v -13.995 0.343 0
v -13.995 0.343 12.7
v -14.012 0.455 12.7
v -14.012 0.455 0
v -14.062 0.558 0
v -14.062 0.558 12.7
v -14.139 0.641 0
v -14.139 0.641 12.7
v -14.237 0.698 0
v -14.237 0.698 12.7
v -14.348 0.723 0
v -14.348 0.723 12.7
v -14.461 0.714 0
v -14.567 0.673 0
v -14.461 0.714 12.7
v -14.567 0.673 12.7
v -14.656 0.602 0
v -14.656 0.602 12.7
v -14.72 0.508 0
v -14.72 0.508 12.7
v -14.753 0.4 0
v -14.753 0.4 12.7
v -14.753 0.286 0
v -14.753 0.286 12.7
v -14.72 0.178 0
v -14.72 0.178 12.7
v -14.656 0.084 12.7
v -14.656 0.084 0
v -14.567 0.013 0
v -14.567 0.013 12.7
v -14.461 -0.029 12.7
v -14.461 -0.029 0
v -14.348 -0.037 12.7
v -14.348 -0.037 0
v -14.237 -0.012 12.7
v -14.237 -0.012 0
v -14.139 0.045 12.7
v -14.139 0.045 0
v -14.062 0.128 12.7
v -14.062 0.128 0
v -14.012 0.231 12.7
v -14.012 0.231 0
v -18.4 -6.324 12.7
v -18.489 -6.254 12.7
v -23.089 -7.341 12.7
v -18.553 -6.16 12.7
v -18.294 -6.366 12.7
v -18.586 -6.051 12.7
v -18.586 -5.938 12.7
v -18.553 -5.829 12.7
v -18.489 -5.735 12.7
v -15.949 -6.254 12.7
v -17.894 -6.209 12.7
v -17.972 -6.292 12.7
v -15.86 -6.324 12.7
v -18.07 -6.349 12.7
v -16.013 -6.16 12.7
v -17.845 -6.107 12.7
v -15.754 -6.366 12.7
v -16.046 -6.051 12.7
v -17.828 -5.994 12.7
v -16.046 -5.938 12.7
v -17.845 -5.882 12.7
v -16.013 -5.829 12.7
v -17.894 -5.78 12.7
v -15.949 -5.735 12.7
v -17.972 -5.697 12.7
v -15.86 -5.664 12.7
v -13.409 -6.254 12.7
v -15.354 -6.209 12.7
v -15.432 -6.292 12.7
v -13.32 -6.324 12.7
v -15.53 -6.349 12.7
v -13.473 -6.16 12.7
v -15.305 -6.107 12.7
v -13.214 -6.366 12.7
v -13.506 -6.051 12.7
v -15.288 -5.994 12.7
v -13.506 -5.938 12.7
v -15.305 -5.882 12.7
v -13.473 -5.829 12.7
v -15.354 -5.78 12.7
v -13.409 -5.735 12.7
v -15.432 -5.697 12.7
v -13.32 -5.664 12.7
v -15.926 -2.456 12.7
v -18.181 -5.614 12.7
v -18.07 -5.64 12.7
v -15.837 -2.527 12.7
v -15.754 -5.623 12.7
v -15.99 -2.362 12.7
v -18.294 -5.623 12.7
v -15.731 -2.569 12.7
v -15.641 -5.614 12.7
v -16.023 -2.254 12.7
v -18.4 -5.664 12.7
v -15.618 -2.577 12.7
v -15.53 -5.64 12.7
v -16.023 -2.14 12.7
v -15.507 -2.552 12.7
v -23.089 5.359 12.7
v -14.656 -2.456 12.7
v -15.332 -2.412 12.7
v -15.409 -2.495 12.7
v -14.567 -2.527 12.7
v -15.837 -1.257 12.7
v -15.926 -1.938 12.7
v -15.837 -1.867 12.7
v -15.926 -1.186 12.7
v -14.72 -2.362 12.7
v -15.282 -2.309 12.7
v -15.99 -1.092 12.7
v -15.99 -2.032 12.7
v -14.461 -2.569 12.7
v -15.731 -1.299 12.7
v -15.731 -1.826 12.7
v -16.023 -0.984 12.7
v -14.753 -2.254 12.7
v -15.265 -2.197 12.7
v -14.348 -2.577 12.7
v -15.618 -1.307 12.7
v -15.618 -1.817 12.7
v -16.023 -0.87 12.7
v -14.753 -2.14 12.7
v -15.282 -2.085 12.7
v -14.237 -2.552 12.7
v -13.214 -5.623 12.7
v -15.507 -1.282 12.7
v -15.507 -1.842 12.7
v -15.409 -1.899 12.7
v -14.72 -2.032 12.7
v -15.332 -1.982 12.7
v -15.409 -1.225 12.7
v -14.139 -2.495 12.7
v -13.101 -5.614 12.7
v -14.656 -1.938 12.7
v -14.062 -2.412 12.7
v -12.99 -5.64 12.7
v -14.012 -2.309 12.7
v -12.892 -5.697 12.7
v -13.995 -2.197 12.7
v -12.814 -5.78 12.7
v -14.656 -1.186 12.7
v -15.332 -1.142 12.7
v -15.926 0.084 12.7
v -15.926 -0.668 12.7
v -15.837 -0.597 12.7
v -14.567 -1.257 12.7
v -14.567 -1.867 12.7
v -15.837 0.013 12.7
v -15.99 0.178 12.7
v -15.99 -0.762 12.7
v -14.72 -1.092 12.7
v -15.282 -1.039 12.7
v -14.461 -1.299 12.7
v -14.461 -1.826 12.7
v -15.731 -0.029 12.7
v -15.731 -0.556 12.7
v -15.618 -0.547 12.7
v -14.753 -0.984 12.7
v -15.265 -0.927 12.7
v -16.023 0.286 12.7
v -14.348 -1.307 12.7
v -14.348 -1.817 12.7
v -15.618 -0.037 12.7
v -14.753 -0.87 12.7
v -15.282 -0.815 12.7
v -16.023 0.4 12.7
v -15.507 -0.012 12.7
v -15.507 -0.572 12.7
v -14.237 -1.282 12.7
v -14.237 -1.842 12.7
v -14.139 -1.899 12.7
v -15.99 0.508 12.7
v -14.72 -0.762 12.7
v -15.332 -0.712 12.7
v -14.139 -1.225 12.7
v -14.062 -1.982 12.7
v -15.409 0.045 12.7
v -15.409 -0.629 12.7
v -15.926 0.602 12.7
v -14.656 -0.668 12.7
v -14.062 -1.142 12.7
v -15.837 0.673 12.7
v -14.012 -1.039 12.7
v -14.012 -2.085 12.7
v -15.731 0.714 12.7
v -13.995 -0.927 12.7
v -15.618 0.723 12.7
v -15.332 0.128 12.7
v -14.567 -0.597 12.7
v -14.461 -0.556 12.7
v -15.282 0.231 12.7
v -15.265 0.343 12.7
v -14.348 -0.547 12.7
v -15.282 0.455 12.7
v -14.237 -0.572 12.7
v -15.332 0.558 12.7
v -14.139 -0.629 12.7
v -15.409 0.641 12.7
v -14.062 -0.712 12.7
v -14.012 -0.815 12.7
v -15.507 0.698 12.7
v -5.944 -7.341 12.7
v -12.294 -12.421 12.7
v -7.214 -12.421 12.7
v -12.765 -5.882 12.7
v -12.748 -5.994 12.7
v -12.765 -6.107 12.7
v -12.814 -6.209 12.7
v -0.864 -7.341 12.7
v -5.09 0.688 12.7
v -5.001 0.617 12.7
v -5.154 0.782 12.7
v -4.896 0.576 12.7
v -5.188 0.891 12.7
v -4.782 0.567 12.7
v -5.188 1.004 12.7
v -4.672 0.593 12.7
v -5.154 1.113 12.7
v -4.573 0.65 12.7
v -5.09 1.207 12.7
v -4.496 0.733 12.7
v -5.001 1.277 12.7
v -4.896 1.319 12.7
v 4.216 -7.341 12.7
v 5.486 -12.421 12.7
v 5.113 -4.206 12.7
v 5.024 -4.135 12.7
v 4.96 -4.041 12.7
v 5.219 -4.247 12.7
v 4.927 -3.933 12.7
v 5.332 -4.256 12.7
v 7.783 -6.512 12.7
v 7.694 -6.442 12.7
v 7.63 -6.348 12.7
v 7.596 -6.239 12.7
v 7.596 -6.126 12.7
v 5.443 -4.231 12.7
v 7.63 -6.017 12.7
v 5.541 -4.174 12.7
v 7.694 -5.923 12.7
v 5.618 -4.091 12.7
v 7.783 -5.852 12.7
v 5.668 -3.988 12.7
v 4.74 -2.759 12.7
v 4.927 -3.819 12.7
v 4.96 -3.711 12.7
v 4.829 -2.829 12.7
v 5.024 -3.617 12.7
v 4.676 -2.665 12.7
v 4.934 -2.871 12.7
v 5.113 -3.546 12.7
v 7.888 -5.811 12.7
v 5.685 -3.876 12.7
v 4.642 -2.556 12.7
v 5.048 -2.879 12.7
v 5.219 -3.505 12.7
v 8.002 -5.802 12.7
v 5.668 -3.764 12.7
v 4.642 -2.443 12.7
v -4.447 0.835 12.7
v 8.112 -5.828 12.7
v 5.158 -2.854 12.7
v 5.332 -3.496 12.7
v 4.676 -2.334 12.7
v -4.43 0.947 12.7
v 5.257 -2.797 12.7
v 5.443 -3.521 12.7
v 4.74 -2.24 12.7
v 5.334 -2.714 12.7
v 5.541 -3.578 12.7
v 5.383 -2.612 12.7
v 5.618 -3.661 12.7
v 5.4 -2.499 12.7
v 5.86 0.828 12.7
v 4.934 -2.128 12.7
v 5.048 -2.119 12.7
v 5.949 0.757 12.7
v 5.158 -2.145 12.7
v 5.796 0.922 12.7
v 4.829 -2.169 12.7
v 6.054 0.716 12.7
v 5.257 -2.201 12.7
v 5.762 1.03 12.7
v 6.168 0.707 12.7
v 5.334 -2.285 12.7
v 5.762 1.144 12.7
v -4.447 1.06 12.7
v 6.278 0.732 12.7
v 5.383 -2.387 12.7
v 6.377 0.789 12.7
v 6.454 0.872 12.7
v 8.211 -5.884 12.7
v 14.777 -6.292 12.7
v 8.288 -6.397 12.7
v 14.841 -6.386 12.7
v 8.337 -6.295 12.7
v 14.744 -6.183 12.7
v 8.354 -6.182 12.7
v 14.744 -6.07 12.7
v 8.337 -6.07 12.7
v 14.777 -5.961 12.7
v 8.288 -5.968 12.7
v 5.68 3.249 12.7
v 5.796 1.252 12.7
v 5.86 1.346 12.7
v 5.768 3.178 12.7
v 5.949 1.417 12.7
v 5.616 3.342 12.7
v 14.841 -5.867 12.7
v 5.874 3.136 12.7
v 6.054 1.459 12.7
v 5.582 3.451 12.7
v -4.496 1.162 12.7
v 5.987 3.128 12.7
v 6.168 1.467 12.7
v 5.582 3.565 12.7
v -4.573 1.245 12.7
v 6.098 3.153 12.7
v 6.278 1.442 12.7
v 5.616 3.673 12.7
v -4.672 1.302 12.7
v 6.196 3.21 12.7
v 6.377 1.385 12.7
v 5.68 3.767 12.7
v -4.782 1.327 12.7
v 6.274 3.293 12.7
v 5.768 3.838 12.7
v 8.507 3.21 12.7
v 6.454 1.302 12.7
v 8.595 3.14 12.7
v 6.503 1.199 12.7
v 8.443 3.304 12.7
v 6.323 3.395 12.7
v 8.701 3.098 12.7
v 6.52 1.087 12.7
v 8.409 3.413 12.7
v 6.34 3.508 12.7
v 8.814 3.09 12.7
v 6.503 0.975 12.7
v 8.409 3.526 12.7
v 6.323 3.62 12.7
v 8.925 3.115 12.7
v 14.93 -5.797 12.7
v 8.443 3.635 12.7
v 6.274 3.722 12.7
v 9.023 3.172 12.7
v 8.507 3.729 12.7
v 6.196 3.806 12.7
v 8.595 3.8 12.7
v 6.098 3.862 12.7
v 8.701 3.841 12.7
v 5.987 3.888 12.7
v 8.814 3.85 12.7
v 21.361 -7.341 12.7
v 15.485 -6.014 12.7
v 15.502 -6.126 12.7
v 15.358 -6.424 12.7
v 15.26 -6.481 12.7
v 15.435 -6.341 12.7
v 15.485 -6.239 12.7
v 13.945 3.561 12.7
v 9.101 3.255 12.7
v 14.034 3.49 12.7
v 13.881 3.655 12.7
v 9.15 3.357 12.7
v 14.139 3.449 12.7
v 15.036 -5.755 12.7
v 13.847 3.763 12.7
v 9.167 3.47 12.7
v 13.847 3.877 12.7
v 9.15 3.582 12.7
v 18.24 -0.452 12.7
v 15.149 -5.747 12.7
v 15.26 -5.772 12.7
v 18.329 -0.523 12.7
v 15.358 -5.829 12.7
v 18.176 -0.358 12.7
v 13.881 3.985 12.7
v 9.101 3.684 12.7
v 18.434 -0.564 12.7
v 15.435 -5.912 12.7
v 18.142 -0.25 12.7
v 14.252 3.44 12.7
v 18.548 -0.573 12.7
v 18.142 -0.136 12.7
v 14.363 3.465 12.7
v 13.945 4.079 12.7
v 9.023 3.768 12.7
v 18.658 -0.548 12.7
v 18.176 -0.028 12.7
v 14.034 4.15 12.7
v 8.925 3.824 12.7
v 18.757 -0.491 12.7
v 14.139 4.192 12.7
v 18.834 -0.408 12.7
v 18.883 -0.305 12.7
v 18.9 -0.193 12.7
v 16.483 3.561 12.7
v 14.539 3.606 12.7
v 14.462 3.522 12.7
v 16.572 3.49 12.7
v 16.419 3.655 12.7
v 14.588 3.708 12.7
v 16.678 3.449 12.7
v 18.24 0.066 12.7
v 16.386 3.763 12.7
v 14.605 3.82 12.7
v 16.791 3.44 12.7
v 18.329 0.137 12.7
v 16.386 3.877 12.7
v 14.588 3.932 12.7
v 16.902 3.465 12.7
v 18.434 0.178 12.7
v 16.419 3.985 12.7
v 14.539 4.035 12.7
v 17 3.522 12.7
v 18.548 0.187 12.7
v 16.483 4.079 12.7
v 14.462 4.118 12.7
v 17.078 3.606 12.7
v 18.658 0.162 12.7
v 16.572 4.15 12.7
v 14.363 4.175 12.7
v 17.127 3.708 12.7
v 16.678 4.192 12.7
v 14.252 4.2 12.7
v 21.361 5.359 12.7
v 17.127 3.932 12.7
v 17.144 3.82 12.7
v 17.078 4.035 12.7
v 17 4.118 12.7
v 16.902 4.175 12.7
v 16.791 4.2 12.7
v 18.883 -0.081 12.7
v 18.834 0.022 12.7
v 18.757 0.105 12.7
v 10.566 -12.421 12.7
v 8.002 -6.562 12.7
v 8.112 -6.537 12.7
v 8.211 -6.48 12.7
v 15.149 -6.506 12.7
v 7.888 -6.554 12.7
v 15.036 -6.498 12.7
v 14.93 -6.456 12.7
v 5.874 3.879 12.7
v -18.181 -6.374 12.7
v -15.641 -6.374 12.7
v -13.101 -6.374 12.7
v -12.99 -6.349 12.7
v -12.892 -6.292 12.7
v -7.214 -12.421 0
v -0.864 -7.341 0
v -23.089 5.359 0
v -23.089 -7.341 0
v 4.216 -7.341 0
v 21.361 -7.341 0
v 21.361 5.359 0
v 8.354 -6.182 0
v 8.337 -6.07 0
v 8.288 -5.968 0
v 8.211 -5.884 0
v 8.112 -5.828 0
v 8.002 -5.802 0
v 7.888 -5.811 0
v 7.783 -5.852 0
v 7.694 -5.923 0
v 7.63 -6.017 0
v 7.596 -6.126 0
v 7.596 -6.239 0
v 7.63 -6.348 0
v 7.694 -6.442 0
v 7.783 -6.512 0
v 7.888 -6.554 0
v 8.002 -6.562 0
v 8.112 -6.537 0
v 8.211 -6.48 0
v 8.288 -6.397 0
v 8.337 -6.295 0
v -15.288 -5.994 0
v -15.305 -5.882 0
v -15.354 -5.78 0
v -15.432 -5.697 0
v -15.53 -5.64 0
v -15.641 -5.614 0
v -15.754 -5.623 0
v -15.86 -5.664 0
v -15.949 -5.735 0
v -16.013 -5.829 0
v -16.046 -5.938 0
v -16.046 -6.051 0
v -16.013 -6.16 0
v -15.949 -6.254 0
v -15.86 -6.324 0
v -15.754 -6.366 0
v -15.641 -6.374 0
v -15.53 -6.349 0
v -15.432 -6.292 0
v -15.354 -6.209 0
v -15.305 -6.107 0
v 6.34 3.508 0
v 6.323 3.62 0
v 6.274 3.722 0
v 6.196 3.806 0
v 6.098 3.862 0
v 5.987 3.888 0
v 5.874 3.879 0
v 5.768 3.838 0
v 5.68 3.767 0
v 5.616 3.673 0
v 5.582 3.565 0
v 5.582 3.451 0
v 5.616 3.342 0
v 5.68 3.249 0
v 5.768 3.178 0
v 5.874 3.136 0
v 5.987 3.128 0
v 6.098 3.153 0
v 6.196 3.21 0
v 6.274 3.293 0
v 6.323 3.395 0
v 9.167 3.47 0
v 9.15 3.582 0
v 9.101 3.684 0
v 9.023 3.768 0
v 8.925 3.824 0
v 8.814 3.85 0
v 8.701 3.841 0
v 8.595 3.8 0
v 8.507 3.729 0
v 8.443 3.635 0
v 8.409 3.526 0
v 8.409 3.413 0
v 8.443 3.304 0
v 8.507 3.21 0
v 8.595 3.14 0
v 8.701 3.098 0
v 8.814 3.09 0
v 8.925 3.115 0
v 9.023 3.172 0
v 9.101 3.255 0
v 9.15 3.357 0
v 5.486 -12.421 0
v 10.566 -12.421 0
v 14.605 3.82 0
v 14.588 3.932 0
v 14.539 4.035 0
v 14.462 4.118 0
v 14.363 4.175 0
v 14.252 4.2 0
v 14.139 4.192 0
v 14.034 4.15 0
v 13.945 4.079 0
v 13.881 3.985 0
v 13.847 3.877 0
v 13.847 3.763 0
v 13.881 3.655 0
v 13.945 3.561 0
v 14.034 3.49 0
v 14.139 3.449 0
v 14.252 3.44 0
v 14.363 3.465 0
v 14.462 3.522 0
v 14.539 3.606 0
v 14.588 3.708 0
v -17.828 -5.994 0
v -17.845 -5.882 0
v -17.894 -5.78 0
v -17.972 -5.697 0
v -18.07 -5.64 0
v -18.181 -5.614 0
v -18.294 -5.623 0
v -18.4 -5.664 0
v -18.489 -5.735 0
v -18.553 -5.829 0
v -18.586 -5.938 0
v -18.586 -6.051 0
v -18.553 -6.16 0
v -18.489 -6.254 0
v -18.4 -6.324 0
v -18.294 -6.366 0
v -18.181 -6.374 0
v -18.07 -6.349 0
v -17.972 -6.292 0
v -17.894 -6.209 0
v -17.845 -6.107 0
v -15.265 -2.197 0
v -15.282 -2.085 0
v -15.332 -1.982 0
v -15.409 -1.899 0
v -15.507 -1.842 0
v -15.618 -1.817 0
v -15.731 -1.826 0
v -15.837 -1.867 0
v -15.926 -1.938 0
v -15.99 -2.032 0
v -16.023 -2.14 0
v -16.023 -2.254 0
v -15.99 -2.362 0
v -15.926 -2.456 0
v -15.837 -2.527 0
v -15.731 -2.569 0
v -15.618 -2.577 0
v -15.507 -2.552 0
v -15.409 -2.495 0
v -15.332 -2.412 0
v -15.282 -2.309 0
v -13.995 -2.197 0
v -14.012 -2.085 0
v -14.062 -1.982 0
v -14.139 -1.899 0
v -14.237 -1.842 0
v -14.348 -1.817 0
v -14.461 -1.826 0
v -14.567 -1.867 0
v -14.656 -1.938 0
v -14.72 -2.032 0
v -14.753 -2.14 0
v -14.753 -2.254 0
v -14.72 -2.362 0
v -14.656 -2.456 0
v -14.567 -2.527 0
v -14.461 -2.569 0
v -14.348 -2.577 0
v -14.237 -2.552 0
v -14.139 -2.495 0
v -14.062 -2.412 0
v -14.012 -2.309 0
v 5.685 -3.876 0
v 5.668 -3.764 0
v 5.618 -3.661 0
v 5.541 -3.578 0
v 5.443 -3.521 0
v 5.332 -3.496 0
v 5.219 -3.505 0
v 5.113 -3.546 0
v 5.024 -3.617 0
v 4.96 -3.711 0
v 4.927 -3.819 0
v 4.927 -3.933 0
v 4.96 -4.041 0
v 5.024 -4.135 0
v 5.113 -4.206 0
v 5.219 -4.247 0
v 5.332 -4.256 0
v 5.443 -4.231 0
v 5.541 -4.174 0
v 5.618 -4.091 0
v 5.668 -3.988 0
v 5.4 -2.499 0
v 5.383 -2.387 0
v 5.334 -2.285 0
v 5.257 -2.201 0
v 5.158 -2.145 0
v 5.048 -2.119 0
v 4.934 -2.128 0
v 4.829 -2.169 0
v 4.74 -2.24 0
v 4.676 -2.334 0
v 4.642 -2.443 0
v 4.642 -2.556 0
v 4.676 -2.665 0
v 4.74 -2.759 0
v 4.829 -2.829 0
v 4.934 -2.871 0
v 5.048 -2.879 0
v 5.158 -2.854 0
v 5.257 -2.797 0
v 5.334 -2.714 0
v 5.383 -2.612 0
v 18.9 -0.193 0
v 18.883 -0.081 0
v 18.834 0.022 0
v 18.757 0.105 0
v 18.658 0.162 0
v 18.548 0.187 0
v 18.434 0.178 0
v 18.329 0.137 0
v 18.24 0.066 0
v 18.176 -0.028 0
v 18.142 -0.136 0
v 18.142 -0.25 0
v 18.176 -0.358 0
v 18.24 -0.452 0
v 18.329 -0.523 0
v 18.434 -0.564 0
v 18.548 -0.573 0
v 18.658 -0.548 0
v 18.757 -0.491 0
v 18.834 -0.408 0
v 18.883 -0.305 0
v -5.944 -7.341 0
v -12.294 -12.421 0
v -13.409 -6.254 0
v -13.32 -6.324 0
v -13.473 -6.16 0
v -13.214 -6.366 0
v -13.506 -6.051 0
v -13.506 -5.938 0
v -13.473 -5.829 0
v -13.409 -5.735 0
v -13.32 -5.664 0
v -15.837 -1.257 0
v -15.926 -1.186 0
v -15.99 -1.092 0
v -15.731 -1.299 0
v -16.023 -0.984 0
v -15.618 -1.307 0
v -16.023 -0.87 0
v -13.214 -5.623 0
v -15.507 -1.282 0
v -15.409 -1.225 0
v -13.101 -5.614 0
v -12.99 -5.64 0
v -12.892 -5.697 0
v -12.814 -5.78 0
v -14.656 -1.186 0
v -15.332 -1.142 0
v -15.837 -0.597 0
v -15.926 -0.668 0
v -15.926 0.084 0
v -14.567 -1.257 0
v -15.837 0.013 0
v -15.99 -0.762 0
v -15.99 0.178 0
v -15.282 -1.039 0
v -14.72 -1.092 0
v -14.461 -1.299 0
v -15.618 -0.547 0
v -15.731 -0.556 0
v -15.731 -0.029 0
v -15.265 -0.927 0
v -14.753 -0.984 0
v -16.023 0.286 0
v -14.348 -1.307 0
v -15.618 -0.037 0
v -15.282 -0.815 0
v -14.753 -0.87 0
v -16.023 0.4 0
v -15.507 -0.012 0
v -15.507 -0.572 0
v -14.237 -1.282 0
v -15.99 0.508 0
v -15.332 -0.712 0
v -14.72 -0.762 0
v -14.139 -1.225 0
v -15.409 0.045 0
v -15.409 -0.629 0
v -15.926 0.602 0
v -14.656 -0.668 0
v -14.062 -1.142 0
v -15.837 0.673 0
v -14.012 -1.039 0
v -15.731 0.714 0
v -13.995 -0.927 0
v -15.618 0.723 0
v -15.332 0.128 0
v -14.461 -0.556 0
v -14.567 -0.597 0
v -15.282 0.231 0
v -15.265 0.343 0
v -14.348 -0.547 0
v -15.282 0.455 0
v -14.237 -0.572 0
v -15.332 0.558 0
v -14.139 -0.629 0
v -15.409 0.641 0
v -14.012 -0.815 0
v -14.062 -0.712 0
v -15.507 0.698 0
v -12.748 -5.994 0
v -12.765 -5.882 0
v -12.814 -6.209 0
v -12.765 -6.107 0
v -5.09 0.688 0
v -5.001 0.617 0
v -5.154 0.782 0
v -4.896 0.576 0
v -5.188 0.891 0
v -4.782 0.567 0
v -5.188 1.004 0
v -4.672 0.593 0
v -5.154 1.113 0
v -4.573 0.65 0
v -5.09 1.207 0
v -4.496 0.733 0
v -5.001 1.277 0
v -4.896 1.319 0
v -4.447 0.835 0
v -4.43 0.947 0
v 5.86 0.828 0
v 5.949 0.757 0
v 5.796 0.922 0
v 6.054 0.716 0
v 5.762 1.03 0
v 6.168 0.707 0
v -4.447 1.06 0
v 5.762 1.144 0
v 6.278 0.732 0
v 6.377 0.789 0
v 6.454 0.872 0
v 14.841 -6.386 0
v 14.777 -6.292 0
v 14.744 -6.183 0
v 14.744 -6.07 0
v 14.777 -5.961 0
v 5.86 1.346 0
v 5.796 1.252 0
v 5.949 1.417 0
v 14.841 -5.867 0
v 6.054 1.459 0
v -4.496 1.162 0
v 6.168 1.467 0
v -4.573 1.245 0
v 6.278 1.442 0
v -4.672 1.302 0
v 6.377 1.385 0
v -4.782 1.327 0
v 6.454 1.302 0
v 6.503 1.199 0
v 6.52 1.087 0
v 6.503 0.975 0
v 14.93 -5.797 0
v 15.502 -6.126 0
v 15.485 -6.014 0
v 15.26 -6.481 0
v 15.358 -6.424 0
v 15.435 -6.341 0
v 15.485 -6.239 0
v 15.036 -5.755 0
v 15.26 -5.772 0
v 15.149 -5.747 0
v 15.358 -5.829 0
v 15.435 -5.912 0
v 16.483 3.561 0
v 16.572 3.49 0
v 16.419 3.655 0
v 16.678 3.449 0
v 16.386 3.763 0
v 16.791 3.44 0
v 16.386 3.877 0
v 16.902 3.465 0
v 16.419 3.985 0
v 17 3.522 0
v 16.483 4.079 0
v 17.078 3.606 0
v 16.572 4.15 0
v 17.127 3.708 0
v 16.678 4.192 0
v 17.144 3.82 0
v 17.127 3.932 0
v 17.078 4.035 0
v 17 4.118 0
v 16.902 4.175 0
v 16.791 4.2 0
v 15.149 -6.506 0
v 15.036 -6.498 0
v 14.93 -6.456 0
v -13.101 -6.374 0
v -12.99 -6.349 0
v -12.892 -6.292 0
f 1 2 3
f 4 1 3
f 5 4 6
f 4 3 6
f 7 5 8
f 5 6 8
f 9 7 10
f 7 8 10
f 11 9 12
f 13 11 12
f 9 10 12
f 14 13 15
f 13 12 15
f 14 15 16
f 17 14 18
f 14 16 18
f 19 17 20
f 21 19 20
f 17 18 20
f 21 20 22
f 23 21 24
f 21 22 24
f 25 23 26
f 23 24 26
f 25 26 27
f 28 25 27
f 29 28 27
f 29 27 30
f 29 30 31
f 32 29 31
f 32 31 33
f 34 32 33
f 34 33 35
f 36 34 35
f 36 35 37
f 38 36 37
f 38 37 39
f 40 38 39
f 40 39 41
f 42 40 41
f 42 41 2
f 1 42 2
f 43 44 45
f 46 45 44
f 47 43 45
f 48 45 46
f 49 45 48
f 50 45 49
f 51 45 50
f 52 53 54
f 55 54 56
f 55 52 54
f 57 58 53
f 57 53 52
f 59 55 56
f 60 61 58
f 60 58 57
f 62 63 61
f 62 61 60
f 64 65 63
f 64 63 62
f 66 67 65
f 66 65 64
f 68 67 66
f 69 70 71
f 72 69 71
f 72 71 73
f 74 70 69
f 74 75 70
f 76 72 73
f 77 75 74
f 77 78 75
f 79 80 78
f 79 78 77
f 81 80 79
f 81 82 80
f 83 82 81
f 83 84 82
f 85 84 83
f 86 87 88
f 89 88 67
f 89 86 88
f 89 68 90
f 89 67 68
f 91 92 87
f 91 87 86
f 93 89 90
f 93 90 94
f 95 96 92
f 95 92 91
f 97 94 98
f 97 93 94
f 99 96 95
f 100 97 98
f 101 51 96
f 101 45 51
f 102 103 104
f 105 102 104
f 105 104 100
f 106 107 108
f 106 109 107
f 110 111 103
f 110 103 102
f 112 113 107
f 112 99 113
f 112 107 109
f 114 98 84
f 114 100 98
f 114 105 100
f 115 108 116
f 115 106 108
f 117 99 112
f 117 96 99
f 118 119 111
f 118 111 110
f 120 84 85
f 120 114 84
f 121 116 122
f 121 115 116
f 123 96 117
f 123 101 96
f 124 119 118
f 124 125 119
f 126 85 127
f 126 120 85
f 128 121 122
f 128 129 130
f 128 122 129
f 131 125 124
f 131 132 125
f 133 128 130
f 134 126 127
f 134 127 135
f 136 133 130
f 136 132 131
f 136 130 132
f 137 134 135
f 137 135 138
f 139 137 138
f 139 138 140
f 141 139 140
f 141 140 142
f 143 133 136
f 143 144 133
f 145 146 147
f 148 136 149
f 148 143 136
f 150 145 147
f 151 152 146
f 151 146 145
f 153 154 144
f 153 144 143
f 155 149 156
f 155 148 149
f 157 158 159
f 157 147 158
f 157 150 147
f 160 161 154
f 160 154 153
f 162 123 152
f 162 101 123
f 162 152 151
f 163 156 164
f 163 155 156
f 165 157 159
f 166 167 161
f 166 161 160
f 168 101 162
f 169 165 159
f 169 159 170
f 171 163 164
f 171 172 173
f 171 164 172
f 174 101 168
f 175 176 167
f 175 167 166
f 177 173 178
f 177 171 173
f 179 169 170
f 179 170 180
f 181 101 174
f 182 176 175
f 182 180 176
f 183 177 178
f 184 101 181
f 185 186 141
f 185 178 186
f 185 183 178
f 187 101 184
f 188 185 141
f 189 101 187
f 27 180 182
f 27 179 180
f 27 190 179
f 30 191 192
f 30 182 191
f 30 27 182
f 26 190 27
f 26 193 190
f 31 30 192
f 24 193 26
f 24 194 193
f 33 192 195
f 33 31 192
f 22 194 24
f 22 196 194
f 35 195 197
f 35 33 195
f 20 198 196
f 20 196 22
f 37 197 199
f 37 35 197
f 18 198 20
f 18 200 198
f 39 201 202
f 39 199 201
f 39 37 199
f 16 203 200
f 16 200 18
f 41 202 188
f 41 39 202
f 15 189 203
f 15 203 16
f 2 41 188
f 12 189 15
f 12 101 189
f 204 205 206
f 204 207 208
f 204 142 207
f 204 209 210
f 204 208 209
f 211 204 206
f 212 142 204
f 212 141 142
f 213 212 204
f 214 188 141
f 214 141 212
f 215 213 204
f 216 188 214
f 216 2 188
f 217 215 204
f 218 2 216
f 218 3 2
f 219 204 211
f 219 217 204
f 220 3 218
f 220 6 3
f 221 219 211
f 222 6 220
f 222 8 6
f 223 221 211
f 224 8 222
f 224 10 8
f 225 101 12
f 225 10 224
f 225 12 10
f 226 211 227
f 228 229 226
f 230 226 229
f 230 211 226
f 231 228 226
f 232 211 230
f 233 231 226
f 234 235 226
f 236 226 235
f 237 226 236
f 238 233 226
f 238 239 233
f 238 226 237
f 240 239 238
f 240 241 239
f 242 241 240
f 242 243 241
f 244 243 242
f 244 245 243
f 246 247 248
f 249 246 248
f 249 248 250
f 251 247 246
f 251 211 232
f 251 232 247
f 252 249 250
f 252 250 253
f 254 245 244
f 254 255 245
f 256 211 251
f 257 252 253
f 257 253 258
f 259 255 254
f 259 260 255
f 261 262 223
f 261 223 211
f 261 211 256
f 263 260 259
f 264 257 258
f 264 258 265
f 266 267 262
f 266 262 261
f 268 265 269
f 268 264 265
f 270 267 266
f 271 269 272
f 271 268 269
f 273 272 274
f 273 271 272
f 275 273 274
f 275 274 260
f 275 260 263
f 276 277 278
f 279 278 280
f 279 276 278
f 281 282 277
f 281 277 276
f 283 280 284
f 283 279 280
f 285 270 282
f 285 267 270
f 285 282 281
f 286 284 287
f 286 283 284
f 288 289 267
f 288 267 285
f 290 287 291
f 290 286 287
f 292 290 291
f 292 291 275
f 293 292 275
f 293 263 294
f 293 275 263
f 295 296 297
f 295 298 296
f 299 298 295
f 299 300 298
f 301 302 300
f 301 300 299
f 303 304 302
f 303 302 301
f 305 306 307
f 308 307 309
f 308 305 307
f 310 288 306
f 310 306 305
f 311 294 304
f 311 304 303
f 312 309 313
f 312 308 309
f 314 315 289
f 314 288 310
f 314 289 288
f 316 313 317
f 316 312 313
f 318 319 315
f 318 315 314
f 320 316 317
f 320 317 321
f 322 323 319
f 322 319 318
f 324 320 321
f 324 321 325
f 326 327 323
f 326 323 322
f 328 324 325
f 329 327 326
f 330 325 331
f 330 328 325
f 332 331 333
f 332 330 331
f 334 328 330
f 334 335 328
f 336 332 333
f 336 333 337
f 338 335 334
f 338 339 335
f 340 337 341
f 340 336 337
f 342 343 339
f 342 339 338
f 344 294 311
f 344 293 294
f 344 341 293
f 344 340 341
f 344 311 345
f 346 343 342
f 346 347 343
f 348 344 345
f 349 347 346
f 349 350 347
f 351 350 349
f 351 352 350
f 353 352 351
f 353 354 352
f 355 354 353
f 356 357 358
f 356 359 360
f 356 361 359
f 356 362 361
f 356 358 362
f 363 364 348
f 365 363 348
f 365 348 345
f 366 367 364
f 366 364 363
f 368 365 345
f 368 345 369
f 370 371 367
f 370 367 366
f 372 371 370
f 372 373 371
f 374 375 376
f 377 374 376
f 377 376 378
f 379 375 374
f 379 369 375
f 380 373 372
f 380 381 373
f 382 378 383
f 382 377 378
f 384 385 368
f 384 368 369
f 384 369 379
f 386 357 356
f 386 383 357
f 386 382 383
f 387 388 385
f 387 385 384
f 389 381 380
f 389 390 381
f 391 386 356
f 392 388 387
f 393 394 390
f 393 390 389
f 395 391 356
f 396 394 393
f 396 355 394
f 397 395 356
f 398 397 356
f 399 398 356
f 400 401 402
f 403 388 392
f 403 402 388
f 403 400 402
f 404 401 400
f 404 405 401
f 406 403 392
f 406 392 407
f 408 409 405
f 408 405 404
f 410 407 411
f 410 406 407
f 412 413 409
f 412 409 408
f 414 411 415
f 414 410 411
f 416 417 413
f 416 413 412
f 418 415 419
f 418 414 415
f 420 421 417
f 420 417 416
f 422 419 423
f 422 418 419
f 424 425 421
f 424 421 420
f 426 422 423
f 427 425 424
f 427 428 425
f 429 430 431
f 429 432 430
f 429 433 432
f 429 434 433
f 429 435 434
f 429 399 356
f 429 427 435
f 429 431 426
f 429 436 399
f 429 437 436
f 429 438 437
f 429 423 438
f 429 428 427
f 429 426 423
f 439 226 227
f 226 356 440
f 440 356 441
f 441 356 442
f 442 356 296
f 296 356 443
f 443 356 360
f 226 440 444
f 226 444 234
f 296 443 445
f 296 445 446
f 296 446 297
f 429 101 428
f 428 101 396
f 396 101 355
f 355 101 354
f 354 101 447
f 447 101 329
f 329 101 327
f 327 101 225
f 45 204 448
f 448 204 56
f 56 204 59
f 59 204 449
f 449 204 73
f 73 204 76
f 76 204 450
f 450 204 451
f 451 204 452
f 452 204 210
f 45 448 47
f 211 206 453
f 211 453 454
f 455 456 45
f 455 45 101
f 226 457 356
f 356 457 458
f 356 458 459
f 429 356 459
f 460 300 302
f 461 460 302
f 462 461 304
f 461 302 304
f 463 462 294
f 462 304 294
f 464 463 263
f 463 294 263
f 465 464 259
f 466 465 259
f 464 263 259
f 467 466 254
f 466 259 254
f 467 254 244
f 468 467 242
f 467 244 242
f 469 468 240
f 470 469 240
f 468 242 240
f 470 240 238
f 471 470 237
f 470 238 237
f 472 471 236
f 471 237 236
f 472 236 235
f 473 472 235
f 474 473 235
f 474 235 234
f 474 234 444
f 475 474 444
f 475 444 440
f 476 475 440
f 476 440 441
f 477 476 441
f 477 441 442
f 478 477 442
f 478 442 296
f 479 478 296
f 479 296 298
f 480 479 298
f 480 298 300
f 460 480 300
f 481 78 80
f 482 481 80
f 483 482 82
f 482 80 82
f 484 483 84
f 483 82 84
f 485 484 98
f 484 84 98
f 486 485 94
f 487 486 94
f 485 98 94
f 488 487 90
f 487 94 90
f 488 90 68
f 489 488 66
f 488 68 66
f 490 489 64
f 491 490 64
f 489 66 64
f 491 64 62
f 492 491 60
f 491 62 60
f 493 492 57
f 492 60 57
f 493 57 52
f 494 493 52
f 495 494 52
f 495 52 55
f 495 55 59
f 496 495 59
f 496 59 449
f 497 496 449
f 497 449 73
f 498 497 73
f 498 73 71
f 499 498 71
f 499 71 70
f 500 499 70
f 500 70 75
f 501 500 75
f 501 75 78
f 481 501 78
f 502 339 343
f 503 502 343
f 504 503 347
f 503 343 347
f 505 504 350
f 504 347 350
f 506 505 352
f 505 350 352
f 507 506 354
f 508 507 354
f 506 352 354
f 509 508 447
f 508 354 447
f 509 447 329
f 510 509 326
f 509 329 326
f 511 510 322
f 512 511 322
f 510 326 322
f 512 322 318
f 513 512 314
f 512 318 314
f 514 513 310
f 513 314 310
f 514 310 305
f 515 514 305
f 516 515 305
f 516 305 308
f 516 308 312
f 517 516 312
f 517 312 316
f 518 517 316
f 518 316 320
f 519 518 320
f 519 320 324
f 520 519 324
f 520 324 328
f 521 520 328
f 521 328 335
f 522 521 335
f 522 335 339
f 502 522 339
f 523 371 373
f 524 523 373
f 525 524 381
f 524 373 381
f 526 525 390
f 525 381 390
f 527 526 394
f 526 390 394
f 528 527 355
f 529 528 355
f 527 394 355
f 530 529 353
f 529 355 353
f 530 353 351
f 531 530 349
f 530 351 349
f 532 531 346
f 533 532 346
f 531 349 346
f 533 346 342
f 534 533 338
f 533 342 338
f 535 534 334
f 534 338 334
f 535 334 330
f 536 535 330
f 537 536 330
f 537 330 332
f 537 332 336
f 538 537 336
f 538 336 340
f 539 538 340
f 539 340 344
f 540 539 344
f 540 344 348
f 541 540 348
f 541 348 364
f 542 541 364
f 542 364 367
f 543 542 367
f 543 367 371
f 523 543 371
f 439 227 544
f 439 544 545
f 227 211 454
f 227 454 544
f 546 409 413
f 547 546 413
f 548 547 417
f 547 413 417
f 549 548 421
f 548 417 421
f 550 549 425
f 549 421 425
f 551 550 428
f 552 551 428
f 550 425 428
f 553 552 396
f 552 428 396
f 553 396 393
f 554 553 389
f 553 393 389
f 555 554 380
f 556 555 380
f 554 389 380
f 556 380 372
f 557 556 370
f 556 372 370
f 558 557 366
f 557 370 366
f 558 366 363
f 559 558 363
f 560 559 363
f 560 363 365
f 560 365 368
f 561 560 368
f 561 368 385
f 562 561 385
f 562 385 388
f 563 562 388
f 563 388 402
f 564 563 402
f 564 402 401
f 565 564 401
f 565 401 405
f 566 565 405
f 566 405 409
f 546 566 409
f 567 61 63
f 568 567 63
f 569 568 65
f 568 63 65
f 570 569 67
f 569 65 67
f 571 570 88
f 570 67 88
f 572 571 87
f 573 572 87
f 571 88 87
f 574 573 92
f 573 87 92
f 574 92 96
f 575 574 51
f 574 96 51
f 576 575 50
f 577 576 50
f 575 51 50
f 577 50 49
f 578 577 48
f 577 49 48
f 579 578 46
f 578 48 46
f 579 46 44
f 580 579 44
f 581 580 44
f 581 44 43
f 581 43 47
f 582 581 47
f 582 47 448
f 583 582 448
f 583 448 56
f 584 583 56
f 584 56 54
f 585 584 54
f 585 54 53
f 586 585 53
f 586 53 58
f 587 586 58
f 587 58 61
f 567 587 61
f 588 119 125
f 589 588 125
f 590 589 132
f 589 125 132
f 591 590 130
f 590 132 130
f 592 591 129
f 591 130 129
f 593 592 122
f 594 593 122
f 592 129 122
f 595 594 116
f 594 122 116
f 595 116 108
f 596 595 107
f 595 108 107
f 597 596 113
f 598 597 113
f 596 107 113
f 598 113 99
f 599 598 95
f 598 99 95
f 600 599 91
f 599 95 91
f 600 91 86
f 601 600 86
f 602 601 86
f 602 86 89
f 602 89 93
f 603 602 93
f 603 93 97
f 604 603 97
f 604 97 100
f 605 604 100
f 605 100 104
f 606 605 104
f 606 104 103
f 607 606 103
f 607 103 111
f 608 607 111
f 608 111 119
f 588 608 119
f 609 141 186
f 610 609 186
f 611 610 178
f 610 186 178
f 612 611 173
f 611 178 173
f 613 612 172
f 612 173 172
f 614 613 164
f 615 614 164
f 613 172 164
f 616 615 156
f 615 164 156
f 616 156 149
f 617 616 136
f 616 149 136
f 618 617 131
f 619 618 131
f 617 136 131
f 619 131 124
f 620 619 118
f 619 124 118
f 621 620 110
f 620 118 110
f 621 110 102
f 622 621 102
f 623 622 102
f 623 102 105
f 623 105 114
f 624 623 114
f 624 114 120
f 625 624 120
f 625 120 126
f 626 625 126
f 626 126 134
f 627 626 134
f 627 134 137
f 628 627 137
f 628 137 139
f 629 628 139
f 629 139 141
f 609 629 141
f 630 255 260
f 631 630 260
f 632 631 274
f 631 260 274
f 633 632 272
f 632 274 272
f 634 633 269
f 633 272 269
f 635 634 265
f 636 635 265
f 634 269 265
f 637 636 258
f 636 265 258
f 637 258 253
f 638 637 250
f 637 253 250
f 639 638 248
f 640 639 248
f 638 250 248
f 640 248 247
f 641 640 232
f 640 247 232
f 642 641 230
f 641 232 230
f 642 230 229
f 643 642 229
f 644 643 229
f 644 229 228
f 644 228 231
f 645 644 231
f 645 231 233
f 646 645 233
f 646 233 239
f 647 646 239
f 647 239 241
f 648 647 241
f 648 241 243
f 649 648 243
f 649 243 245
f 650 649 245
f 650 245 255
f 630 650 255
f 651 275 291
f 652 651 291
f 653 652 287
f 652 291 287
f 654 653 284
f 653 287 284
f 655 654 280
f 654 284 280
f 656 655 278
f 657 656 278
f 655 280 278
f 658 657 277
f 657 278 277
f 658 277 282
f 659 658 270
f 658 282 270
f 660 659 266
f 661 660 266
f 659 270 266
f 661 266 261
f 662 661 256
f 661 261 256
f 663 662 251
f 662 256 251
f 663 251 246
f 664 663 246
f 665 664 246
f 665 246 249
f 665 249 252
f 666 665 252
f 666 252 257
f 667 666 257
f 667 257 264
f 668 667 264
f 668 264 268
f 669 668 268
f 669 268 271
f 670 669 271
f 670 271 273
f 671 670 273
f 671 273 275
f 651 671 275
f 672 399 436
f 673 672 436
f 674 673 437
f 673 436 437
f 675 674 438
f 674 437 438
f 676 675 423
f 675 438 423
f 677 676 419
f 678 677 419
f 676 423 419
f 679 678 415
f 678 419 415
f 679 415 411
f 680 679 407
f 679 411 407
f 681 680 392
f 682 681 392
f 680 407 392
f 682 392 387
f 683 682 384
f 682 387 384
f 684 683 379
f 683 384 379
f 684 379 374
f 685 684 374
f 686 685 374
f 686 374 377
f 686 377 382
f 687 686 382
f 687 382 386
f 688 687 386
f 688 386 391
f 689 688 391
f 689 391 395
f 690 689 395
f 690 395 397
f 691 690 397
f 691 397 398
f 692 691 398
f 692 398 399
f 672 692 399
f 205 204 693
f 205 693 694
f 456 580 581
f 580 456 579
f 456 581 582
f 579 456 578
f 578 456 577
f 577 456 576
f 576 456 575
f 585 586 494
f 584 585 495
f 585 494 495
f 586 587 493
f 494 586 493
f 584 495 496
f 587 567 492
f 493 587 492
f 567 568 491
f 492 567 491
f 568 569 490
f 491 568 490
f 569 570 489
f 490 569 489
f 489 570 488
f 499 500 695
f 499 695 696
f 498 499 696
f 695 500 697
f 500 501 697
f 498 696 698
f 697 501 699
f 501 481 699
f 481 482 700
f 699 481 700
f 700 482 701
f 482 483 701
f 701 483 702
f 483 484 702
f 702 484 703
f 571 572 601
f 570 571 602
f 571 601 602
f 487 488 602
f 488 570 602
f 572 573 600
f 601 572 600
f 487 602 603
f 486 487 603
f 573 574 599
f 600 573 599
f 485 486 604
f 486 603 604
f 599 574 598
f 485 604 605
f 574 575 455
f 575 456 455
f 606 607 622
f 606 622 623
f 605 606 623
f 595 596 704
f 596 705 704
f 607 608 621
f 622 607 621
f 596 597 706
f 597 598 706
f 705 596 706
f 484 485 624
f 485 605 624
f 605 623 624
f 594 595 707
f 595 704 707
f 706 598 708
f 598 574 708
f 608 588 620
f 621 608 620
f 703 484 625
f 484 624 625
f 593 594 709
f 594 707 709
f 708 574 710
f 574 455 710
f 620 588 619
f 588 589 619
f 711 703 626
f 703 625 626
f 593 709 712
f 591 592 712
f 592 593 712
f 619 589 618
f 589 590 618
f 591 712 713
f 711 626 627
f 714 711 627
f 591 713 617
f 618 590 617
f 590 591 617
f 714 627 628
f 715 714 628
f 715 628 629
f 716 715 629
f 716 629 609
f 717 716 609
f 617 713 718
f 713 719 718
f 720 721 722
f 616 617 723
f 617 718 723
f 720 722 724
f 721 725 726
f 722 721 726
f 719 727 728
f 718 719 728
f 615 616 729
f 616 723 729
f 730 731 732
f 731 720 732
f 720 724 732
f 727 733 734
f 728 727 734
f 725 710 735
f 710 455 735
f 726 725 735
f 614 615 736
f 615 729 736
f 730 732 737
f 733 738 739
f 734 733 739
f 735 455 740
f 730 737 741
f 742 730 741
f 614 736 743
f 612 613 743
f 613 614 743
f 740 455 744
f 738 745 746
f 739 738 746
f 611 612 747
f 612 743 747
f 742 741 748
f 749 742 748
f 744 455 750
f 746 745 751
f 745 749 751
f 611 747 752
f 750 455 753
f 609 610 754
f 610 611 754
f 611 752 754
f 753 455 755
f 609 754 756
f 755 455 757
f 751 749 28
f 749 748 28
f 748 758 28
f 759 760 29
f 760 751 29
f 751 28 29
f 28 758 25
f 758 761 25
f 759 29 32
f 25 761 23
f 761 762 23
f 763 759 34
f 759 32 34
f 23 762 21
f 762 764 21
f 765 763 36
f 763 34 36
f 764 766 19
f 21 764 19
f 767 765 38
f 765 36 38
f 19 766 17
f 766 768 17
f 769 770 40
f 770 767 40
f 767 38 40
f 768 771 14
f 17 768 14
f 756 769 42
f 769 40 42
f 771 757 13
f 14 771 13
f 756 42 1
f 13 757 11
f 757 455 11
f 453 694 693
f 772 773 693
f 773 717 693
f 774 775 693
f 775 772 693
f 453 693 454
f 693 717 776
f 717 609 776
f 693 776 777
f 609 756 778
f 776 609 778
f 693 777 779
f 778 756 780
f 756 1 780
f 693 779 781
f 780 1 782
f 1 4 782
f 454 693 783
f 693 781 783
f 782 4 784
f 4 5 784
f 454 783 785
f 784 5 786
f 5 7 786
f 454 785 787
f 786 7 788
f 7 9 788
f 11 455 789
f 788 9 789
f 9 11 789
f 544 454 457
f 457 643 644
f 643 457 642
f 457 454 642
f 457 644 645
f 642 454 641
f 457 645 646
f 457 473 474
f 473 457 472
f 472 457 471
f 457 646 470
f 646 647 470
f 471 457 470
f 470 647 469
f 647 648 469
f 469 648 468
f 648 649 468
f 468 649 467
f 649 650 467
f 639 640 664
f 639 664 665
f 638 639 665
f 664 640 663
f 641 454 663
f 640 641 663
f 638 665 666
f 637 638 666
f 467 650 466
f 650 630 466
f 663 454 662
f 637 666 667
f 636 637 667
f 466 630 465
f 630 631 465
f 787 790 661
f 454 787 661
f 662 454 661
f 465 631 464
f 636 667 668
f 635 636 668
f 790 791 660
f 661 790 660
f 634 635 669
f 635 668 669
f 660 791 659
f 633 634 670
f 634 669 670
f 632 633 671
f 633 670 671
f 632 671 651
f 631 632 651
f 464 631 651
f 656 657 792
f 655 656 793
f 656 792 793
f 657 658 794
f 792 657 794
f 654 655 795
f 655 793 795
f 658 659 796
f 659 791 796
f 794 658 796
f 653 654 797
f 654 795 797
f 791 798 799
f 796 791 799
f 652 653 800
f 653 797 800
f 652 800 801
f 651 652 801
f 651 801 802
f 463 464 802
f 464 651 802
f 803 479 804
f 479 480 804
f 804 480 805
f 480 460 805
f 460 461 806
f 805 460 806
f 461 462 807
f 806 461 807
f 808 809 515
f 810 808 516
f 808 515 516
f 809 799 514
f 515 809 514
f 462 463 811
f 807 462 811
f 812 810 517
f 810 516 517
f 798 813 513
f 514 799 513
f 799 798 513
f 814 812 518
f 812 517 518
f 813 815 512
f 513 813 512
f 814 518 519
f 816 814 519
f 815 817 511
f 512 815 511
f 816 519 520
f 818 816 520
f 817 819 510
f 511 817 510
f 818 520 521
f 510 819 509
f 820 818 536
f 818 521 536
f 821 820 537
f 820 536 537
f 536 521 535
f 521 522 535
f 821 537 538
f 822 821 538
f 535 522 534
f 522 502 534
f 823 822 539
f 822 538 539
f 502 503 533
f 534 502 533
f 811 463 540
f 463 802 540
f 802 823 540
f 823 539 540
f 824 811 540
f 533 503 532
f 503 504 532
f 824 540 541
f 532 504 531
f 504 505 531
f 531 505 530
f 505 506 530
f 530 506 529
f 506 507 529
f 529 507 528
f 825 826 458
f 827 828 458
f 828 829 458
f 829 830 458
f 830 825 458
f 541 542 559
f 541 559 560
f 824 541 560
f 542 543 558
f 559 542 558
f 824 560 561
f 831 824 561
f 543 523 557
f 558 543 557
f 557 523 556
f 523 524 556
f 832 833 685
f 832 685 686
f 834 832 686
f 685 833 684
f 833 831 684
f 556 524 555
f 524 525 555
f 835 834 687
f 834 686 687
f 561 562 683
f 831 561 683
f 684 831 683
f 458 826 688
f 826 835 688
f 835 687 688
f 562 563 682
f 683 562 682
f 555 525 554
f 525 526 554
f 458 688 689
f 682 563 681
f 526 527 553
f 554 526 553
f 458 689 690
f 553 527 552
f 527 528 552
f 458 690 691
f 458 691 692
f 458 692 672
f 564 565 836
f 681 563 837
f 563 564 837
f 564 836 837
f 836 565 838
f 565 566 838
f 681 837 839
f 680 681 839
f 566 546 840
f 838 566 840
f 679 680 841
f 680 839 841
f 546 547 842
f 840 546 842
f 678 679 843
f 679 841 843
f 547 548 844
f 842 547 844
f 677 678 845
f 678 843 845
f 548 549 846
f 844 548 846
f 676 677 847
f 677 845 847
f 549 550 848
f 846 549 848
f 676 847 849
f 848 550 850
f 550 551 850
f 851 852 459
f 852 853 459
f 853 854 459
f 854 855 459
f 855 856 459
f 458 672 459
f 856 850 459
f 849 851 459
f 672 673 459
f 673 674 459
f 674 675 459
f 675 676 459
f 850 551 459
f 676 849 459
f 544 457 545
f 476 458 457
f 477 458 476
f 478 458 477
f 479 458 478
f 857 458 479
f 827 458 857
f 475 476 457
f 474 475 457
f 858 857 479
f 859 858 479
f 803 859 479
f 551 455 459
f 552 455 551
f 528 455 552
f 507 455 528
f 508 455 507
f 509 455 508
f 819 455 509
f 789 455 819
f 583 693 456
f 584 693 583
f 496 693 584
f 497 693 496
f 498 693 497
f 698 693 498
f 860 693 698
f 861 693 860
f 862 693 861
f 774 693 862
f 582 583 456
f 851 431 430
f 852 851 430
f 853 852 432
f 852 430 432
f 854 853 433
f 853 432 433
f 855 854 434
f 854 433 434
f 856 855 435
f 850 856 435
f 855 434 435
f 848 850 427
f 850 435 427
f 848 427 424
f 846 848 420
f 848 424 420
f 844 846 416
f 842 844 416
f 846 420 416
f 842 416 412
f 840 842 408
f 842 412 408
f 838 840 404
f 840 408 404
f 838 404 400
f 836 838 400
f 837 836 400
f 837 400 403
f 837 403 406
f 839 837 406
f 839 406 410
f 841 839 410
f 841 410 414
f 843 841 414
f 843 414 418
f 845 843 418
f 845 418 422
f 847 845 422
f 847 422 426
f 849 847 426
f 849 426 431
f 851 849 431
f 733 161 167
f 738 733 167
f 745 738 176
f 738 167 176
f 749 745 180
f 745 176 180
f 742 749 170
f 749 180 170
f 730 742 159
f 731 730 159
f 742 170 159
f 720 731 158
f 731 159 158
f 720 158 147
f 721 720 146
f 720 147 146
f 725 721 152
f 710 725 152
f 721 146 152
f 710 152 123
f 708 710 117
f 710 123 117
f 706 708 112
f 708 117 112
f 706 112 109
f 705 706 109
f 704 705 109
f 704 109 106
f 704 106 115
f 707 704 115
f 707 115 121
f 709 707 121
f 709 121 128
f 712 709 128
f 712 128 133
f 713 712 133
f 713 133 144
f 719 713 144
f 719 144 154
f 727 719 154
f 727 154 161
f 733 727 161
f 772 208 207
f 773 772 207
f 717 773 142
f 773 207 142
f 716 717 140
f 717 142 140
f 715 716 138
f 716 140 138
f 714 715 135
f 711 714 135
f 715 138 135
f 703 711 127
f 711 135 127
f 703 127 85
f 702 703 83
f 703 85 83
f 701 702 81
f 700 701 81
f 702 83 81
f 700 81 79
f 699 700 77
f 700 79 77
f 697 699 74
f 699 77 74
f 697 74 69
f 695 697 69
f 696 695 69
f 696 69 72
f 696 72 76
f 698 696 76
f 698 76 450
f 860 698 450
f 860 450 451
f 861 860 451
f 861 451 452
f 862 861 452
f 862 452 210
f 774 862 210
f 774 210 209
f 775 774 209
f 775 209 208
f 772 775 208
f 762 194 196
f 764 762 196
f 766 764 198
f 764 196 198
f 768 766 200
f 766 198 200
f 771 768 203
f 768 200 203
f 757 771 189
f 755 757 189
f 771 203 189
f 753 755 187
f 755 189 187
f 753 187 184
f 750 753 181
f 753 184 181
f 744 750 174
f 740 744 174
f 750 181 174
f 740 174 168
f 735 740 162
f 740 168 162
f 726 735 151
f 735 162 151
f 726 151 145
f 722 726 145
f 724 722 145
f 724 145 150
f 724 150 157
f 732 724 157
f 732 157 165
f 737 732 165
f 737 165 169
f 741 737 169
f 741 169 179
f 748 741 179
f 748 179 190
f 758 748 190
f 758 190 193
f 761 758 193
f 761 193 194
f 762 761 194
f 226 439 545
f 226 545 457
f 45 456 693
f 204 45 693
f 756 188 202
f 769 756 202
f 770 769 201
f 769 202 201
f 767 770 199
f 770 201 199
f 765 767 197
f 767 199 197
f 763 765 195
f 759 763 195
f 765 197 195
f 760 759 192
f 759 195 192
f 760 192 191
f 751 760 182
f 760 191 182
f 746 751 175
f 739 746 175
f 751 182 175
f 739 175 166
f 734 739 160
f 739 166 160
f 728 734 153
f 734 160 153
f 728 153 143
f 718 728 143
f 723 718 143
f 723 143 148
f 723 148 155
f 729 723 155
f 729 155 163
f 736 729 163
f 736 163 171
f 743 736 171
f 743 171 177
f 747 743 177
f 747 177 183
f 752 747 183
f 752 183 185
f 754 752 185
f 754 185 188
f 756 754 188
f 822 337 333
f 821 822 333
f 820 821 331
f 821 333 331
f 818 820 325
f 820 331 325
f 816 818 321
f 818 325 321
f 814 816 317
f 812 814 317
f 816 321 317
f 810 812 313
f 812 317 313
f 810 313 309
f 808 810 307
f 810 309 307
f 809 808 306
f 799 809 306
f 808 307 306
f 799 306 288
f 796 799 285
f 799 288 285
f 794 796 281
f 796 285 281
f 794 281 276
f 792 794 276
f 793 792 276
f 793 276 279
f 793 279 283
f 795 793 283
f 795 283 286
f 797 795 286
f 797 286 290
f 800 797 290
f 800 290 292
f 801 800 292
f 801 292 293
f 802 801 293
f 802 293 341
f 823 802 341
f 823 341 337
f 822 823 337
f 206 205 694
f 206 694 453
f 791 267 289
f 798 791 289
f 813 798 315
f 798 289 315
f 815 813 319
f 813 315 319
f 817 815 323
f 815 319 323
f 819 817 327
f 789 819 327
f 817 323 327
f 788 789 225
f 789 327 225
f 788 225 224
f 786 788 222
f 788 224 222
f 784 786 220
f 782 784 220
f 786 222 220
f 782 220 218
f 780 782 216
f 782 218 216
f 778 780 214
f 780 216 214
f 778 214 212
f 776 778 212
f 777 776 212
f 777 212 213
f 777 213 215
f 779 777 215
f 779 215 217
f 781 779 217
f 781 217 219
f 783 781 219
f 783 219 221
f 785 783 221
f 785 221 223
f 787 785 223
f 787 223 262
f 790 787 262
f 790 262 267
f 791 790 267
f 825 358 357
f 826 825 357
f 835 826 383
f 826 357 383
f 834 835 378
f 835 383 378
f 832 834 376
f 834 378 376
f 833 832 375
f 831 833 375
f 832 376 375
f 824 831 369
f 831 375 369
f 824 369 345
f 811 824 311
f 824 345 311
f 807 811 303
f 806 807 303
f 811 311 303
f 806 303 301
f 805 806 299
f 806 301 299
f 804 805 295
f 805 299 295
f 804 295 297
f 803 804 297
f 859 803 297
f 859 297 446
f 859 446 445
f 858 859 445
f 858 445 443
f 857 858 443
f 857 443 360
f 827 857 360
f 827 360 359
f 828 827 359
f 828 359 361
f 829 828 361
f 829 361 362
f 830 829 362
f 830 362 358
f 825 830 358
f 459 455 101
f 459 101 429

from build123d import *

# Parameters (mm, degrees)
F2_W     = 44.45
F2_H     = 12.7
F3_DEPTH = 12.7
F4_R     = 0.381
F5_DEPTH = 12.701
F7_DEPTH = 12.7


with BuildPart() as f3:
    # F2 (on face) → F3 (new body)
    with BuildSketch(Plane.XY):
        with Locations((-0.8636, -0.9906)):
            Rectangle(F2_W, F2_H)
    extrude(amount=F3_DEPTH)

    # F4 (on face) → F5 (cut, through all)
    with BuildSketch(Plane.XY.offset(12.7)):
        with Locations((-18.20926, -5.9944)):
            Circle(F4_R)
        with Locations((-15.66926, -5.9944)):
            Circle(F4_R)
        with Locations((-13.12926, -5.9944)):
            Circle(F4_R)
        with Locations((-14.3764, -2.1971)):
            Circle(F4_R)
        with Locations((-15.6464, -2.1971)):
            Circle(F4_R)
        with Locations((-15.6464, -0.9271)):
            Circle(F4_R)
        with Locations((-14.3764, -0.9271)):
            Circle(F4_R)
        with Locations((-14.3764, 0.3429)):
            Circle(F4_R)
        with Locations((-15.6464, 0.3429)):
            Circle(F4_R)
        with Locations((-4.81076, 0.94742)):
            Circle(F4_R)
        with Locations((5.30352, -3.87604)):
            Circle(F4_R)
        with Locations((5.01904, -2.49936)):
            Circle(F4_R)
        with Locations((6.13918, 1.08712)):
            Circle(F4_R)
        with Locations((5.95884, 3.50774)):
            Circle(F4_R)
        with Locations((8.78586, 3.46964)):
            Circle(F4_R)
        with Locations((18.51914, -0.19304)):
            Circle(F4_R)
        with Locations((16.76273, 3.82016)):
            Circle(F4_R)
        with Locations((14.224, 3.82016)):
            Circle(F4_R)
        with Locations((7.97306, -6.18236)):
            Circle(F4_R)
        with Locations((15.12062, -6.12648)):
            Circle(F4_R)
    extrude(amount=-F5_DEPTH, mode=Mode.SUBTRACT)

    # F6 (on face) → F7 (join, through all)
    with BuildSketch(Plane.XY.offset(12.7)):
        Polygon((-7.2136, -12.4206), (-0.8636, -7.3406), (-5.9436, -7.3406), (-12.2936, -12.4206), align=None)
        Polygon((10.5664, -12.4206), (4.2164, -7.3406), (-0.8636, -7.3406), (5.4864, -12.4206), align=None)
    extrude(amount=-F7_DEPTH)


solid = f3.part
